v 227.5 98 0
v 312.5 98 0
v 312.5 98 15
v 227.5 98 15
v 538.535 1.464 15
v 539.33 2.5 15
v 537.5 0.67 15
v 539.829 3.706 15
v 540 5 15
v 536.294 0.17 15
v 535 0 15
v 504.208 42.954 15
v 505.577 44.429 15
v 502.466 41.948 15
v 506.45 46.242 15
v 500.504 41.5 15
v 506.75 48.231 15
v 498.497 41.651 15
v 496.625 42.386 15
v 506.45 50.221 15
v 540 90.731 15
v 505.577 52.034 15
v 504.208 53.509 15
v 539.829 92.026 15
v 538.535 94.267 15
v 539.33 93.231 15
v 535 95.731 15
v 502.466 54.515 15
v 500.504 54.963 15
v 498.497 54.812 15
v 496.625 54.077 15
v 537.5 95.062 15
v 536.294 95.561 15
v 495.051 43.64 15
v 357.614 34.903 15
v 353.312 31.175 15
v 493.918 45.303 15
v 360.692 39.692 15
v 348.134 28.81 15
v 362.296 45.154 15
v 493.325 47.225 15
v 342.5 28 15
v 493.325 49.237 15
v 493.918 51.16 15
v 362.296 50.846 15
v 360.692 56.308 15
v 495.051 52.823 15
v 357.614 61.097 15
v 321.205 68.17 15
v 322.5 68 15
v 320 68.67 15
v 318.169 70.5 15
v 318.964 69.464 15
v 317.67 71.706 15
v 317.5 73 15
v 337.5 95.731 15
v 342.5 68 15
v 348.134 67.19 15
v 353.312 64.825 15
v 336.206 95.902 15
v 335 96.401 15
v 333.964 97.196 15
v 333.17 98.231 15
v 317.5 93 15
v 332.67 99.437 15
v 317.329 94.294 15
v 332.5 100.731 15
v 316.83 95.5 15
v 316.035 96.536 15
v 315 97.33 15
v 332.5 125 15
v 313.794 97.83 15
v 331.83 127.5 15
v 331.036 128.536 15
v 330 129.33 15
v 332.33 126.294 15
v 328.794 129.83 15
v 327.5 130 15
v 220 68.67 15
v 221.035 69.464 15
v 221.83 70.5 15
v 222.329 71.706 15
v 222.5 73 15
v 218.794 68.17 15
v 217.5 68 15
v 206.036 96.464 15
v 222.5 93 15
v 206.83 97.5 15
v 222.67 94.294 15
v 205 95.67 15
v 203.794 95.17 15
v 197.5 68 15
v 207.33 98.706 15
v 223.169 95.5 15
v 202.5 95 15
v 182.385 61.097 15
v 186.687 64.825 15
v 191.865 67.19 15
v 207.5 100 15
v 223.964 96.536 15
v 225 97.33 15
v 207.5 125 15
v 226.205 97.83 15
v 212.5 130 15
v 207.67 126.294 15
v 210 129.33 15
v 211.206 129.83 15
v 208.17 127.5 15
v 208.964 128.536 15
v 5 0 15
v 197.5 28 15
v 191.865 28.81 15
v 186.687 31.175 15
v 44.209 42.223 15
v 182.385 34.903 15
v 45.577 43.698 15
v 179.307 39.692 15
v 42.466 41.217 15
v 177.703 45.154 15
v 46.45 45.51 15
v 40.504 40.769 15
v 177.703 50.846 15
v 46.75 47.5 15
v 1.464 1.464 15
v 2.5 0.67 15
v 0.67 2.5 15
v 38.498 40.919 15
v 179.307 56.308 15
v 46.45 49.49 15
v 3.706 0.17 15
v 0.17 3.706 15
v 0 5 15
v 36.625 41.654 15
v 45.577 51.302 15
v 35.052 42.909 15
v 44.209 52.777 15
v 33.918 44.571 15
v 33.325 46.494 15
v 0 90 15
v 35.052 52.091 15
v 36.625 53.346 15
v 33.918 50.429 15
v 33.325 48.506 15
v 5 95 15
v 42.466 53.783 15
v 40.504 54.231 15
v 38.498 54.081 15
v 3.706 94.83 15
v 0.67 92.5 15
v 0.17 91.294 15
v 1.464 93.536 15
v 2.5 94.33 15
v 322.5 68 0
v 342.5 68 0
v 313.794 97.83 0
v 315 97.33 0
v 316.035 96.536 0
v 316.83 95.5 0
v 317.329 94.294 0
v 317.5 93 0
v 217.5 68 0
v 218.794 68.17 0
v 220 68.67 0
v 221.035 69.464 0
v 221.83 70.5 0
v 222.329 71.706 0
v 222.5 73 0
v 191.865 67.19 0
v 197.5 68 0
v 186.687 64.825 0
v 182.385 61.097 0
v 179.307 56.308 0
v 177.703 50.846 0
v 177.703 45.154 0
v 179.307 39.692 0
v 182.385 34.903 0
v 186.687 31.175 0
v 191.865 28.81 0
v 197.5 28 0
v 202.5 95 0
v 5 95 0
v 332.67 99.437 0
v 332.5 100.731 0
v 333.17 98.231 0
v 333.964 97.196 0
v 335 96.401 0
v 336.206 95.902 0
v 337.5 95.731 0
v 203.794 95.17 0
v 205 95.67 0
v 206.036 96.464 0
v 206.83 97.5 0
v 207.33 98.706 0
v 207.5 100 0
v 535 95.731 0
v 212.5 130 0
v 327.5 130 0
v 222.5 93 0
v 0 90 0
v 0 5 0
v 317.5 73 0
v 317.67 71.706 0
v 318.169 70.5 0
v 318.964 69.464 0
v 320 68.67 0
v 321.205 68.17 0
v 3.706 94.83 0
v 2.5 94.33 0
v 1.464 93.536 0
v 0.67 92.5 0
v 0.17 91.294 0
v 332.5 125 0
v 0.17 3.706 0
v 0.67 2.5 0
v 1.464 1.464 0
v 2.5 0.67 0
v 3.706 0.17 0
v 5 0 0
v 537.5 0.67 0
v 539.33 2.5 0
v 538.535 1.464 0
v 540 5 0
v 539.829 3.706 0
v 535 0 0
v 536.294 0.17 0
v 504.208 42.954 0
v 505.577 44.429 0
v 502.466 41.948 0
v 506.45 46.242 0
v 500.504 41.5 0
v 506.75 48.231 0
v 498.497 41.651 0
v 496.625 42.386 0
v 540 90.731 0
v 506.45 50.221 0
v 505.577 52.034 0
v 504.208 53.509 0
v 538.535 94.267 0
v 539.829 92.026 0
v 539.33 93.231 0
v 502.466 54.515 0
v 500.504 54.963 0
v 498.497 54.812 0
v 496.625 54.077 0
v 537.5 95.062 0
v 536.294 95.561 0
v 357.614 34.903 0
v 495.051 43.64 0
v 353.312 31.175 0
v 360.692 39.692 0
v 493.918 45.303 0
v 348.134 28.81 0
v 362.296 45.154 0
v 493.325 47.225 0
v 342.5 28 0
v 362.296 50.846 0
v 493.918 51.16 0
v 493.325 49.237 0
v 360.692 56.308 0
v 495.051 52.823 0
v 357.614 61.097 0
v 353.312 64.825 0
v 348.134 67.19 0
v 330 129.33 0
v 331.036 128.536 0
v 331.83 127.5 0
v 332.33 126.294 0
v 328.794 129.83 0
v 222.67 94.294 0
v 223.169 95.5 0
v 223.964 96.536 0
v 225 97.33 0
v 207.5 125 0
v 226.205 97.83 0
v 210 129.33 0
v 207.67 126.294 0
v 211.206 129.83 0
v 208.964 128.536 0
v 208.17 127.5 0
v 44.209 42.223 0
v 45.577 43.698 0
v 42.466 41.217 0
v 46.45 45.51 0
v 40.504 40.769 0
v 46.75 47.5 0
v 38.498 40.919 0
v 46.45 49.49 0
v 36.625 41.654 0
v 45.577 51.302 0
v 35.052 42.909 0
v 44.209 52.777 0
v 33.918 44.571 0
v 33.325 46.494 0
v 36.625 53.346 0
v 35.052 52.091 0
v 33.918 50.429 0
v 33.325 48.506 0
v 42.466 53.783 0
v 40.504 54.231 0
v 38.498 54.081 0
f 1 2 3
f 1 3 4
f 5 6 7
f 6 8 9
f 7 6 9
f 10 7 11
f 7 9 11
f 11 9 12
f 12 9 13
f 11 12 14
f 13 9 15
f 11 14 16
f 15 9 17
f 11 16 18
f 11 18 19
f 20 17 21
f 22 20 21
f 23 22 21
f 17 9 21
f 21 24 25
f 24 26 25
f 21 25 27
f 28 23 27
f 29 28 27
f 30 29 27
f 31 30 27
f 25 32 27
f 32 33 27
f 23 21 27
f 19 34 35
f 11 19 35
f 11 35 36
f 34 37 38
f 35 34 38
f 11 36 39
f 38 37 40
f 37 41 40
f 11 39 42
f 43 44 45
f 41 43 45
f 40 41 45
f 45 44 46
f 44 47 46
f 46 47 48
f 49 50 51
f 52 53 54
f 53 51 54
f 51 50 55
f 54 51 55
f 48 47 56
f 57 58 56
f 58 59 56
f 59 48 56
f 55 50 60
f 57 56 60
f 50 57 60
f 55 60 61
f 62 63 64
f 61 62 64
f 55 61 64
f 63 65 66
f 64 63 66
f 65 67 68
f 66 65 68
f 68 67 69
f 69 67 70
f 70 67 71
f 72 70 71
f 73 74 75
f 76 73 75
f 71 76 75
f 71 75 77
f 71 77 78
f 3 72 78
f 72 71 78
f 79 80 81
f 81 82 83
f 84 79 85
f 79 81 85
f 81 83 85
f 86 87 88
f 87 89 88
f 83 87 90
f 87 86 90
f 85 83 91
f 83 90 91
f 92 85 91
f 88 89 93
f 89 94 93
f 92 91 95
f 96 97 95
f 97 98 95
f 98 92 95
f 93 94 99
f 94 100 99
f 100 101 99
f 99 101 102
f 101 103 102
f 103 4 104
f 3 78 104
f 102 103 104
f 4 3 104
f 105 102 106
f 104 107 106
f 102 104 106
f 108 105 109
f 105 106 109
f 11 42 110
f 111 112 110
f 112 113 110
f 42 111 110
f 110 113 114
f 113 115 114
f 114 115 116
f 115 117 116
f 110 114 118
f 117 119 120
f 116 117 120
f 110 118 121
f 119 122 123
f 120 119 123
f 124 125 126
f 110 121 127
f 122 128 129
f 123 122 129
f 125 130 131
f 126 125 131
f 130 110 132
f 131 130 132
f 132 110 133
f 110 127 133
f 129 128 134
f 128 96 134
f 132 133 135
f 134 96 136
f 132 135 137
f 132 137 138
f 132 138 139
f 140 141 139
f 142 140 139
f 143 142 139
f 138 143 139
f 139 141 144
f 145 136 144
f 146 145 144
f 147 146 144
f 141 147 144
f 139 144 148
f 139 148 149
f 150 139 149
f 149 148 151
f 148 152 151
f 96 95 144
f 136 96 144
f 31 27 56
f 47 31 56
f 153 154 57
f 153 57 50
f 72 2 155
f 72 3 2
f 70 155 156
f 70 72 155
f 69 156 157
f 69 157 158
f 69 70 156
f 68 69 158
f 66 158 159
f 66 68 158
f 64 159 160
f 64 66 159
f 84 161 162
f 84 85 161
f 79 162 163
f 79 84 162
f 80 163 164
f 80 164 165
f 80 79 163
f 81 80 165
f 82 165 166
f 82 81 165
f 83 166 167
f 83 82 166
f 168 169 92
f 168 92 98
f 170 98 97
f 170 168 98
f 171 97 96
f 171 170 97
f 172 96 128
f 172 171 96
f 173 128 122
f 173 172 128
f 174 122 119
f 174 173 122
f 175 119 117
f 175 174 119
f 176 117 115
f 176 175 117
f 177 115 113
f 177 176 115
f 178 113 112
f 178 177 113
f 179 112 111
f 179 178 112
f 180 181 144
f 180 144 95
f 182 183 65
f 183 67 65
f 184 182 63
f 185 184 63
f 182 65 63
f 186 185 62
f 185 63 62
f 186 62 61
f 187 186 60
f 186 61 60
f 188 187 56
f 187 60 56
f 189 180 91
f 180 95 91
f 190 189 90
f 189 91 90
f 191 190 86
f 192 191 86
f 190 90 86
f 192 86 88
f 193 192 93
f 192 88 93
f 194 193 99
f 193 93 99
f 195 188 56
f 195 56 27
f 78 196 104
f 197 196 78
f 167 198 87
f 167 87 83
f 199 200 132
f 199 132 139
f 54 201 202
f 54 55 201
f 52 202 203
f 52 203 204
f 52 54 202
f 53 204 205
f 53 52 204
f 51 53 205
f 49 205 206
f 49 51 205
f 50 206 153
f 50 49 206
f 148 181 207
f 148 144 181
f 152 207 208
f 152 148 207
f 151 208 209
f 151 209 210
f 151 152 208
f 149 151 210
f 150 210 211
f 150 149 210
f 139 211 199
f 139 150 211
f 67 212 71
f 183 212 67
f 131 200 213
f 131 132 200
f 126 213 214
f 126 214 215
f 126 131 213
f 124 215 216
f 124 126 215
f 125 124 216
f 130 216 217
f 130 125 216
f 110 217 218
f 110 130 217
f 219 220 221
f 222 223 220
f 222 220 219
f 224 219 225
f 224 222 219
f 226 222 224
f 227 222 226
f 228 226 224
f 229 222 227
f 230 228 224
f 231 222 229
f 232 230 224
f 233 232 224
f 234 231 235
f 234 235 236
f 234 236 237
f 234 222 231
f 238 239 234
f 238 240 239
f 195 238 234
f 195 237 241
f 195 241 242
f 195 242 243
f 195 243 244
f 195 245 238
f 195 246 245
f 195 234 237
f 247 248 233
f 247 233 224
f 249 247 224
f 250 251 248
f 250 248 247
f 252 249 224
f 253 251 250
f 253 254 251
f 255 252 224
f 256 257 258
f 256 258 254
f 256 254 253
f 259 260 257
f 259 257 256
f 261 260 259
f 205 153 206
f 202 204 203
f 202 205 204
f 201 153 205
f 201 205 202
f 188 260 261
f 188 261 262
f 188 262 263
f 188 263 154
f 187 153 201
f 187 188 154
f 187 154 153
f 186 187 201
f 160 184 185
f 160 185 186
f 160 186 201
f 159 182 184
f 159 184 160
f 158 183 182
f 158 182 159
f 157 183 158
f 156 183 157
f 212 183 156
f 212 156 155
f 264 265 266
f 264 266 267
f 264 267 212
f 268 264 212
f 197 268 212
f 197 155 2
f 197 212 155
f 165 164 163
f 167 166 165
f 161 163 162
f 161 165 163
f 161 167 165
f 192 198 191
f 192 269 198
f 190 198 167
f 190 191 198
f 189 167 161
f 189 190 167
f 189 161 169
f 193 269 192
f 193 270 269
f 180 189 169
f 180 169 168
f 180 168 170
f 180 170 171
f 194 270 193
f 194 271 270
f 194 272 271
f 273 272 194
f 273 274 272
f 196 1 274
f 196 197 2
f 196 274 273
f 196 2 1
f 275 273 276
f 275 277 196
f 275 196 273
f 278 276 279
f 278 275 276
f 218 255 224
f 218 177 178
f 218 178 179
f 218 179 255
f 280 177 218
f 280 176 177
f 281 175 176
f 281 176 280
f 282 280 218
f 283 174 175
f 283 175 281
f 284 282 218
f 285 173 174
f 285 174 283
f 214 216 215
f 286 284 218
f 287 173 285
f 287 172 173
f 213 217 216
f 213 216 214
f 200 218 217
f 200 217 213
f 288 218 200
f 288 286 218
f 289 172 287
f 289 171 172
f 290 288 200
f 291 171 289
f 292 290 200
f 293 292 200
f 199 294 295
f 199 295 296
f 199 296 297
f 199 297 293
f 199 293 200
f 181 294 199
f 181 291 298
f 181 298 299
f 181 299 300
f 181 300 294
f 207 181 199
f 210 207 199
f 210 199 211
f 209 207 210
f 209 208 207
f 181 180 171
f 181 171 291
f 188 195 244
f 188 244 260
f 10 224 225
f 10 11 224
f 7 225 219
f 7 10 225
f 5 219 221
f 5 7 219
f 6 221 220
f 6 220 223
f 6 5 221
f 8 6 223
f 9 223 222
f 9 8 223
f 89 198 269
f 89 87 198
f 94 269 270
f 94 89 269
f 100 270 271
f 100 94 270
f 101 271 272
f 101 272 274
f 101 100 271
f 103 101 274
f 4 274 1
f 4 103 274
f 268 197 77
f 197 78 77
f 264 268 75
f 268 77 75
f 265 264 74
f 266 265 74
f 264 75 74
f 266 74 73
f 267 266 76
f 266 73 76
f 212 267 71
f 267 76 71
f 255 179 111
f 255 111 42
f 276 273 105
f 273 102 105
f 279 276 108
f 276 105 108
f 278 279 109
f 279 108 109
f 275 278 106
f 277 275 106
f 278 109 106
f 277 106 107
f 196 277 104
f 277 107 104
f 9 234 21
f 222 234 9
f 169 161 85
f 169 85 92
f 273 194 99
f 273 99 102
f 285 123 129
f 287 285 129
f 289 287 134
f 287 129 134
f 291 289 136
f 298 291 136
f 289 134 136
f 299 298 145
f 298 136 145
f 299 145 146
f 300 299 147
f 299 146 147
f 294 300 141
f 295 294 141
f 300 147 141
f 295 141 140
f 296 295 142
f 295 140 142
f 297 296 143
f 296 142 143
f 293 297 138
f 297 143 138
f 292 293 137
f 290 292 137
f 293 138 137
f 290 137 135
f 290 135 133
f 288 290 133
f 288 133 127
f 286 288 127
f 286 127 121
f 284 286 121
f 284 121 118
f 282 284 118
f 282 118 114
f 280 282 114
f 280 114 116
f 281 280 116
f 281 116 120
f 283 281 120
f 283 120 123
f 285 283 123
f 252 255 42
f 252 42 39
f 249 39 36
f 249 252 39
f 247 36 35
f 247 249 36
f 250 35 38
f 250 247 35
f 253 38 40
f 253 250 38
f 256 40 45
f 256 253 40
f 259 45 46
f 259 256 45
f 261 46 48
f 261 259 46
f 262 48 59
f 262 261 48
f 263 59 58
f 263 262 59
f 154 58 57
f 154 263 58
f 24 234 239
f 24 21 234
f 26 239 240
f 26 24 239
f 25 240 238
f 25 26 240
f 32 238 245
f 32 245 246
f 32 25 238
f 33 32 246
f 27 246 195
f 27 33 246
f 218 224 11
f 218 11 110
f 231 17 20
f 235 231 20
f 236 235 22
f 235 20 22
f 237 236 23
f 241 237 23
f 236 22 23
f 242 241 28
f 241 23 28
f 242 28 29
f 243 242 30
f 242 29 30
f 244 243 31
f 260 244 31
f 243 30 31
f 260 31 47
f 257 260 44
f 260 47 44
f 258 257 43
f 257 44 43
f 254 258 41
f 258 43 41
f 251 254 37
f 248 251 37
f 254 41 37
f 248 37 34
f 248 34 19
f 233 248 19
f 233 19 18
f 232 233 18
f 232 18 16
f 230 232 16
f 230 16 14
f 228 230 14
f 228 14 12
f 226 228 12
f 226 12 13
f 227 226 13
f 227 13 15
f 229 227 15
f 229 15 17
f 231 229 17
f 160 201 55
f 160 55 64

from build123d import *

# Parameters (mm, degrees)
BOSS_EXTRU_1_DEPTH      = 15
D_GAGEMENT_M121_D       = 13.5
ENL_V_MAT_EXTRU_8_DEPTH = 33
CONG_1_R                = 5
CONG_2_R                = 5
CONG_3_R                = 5


with BuildPart() as part:
    # Esquisse1 → Boss.-Extru.1 (new body)
    with BuildSketch(Plane.XY):
        Polygon((0, 95), (207.5, 95), (207.5, 130), (332.5, 130), (332.5, 95.731450782), (539.999504611, 95.731450782), (539.999504611, 0), (0, 0), align=None)
    extrude(amount=BOSS_EXTRU_1_DEPTH)

    # Dégagement M121 (through all)
    with Locations(Plane(origin=(0, 0, 0), x_dir=(-1, 0, 0), z_dir=(0, 0, -1))):
        with Locations((-40, 47.5), (-499.999504611, 48.231450782)):
            Hole(D_GAGEMENT_M121_D / 2)

    # Esquisse20 → Enlèv. mat.-Extru.8 (cut)
    with BuildSketch(Plane(origin=(0, 0, 0), x_dir=(-1, 0, 0), z_dir=(0, 0, -1))):
        with BuildLine():
            Line((-197.499504611, 28), (-342.499504611, 28))
            ThreePointArc((-342.499504611, 28), (-362.499504611, 48), (-342.499504611, 68))
            Line((-342.499504611, 68), (-317.499504611, 68))
            Line((-317.499504611, 68), (-317.499504611, 98))
            Line((-317.499504611, 98), (-222.499504611, 98))
            Line((-222.499504611, 98), (-222.499504611, 68))
            Line((-222.499504611, 68), (-197.499504611, 68))
            ThreePointArc((-197.499504611, 68), (-177.499504611, 48), (-197.499504611, 28))
        make_face()
    extrude(amount=-ENL_V_MAT_EXTRU_8_DEPTH, mode=Mode.SUBTRACT)

    # Congé1
    cong_1_edges = [part.edges().sort_by_distance(p)[0] for p in [
        (207.5, 95, 7.5),
        (207.5, 130, 7.5),
        (332.5, 130, 7.5),
        (332.5, 95.731450782, 7.5),
    ]]
    fillet(cong_1_edges, radius=CONG_1_R)

    # Congé2
    cong_2_edges = [part.edges().sort_by_distance(p)[0] for p in [
        (317.499504611, 68, 7.5),
        (317.499504611, 98, 7.5),
        (222.499504611, 98, 7.5),
        (222.499504611, 68, 7.5),
    ]]
    fillet(cong_2_edges, radius=CONG_2_R)

    # Congé3
    cong_3_edges = [part.edges().sort_by_distance(p)[0] for p in [
        (0, 95, 7.5),
        (539.999504611, 95.731450782, 7.5),
        (539.999504611, 0, 7.5),
        (0, 0, 7.5),
    ]]
    fillet(cong_3_edges, radius=CONG_3_R)


solid = part.part
